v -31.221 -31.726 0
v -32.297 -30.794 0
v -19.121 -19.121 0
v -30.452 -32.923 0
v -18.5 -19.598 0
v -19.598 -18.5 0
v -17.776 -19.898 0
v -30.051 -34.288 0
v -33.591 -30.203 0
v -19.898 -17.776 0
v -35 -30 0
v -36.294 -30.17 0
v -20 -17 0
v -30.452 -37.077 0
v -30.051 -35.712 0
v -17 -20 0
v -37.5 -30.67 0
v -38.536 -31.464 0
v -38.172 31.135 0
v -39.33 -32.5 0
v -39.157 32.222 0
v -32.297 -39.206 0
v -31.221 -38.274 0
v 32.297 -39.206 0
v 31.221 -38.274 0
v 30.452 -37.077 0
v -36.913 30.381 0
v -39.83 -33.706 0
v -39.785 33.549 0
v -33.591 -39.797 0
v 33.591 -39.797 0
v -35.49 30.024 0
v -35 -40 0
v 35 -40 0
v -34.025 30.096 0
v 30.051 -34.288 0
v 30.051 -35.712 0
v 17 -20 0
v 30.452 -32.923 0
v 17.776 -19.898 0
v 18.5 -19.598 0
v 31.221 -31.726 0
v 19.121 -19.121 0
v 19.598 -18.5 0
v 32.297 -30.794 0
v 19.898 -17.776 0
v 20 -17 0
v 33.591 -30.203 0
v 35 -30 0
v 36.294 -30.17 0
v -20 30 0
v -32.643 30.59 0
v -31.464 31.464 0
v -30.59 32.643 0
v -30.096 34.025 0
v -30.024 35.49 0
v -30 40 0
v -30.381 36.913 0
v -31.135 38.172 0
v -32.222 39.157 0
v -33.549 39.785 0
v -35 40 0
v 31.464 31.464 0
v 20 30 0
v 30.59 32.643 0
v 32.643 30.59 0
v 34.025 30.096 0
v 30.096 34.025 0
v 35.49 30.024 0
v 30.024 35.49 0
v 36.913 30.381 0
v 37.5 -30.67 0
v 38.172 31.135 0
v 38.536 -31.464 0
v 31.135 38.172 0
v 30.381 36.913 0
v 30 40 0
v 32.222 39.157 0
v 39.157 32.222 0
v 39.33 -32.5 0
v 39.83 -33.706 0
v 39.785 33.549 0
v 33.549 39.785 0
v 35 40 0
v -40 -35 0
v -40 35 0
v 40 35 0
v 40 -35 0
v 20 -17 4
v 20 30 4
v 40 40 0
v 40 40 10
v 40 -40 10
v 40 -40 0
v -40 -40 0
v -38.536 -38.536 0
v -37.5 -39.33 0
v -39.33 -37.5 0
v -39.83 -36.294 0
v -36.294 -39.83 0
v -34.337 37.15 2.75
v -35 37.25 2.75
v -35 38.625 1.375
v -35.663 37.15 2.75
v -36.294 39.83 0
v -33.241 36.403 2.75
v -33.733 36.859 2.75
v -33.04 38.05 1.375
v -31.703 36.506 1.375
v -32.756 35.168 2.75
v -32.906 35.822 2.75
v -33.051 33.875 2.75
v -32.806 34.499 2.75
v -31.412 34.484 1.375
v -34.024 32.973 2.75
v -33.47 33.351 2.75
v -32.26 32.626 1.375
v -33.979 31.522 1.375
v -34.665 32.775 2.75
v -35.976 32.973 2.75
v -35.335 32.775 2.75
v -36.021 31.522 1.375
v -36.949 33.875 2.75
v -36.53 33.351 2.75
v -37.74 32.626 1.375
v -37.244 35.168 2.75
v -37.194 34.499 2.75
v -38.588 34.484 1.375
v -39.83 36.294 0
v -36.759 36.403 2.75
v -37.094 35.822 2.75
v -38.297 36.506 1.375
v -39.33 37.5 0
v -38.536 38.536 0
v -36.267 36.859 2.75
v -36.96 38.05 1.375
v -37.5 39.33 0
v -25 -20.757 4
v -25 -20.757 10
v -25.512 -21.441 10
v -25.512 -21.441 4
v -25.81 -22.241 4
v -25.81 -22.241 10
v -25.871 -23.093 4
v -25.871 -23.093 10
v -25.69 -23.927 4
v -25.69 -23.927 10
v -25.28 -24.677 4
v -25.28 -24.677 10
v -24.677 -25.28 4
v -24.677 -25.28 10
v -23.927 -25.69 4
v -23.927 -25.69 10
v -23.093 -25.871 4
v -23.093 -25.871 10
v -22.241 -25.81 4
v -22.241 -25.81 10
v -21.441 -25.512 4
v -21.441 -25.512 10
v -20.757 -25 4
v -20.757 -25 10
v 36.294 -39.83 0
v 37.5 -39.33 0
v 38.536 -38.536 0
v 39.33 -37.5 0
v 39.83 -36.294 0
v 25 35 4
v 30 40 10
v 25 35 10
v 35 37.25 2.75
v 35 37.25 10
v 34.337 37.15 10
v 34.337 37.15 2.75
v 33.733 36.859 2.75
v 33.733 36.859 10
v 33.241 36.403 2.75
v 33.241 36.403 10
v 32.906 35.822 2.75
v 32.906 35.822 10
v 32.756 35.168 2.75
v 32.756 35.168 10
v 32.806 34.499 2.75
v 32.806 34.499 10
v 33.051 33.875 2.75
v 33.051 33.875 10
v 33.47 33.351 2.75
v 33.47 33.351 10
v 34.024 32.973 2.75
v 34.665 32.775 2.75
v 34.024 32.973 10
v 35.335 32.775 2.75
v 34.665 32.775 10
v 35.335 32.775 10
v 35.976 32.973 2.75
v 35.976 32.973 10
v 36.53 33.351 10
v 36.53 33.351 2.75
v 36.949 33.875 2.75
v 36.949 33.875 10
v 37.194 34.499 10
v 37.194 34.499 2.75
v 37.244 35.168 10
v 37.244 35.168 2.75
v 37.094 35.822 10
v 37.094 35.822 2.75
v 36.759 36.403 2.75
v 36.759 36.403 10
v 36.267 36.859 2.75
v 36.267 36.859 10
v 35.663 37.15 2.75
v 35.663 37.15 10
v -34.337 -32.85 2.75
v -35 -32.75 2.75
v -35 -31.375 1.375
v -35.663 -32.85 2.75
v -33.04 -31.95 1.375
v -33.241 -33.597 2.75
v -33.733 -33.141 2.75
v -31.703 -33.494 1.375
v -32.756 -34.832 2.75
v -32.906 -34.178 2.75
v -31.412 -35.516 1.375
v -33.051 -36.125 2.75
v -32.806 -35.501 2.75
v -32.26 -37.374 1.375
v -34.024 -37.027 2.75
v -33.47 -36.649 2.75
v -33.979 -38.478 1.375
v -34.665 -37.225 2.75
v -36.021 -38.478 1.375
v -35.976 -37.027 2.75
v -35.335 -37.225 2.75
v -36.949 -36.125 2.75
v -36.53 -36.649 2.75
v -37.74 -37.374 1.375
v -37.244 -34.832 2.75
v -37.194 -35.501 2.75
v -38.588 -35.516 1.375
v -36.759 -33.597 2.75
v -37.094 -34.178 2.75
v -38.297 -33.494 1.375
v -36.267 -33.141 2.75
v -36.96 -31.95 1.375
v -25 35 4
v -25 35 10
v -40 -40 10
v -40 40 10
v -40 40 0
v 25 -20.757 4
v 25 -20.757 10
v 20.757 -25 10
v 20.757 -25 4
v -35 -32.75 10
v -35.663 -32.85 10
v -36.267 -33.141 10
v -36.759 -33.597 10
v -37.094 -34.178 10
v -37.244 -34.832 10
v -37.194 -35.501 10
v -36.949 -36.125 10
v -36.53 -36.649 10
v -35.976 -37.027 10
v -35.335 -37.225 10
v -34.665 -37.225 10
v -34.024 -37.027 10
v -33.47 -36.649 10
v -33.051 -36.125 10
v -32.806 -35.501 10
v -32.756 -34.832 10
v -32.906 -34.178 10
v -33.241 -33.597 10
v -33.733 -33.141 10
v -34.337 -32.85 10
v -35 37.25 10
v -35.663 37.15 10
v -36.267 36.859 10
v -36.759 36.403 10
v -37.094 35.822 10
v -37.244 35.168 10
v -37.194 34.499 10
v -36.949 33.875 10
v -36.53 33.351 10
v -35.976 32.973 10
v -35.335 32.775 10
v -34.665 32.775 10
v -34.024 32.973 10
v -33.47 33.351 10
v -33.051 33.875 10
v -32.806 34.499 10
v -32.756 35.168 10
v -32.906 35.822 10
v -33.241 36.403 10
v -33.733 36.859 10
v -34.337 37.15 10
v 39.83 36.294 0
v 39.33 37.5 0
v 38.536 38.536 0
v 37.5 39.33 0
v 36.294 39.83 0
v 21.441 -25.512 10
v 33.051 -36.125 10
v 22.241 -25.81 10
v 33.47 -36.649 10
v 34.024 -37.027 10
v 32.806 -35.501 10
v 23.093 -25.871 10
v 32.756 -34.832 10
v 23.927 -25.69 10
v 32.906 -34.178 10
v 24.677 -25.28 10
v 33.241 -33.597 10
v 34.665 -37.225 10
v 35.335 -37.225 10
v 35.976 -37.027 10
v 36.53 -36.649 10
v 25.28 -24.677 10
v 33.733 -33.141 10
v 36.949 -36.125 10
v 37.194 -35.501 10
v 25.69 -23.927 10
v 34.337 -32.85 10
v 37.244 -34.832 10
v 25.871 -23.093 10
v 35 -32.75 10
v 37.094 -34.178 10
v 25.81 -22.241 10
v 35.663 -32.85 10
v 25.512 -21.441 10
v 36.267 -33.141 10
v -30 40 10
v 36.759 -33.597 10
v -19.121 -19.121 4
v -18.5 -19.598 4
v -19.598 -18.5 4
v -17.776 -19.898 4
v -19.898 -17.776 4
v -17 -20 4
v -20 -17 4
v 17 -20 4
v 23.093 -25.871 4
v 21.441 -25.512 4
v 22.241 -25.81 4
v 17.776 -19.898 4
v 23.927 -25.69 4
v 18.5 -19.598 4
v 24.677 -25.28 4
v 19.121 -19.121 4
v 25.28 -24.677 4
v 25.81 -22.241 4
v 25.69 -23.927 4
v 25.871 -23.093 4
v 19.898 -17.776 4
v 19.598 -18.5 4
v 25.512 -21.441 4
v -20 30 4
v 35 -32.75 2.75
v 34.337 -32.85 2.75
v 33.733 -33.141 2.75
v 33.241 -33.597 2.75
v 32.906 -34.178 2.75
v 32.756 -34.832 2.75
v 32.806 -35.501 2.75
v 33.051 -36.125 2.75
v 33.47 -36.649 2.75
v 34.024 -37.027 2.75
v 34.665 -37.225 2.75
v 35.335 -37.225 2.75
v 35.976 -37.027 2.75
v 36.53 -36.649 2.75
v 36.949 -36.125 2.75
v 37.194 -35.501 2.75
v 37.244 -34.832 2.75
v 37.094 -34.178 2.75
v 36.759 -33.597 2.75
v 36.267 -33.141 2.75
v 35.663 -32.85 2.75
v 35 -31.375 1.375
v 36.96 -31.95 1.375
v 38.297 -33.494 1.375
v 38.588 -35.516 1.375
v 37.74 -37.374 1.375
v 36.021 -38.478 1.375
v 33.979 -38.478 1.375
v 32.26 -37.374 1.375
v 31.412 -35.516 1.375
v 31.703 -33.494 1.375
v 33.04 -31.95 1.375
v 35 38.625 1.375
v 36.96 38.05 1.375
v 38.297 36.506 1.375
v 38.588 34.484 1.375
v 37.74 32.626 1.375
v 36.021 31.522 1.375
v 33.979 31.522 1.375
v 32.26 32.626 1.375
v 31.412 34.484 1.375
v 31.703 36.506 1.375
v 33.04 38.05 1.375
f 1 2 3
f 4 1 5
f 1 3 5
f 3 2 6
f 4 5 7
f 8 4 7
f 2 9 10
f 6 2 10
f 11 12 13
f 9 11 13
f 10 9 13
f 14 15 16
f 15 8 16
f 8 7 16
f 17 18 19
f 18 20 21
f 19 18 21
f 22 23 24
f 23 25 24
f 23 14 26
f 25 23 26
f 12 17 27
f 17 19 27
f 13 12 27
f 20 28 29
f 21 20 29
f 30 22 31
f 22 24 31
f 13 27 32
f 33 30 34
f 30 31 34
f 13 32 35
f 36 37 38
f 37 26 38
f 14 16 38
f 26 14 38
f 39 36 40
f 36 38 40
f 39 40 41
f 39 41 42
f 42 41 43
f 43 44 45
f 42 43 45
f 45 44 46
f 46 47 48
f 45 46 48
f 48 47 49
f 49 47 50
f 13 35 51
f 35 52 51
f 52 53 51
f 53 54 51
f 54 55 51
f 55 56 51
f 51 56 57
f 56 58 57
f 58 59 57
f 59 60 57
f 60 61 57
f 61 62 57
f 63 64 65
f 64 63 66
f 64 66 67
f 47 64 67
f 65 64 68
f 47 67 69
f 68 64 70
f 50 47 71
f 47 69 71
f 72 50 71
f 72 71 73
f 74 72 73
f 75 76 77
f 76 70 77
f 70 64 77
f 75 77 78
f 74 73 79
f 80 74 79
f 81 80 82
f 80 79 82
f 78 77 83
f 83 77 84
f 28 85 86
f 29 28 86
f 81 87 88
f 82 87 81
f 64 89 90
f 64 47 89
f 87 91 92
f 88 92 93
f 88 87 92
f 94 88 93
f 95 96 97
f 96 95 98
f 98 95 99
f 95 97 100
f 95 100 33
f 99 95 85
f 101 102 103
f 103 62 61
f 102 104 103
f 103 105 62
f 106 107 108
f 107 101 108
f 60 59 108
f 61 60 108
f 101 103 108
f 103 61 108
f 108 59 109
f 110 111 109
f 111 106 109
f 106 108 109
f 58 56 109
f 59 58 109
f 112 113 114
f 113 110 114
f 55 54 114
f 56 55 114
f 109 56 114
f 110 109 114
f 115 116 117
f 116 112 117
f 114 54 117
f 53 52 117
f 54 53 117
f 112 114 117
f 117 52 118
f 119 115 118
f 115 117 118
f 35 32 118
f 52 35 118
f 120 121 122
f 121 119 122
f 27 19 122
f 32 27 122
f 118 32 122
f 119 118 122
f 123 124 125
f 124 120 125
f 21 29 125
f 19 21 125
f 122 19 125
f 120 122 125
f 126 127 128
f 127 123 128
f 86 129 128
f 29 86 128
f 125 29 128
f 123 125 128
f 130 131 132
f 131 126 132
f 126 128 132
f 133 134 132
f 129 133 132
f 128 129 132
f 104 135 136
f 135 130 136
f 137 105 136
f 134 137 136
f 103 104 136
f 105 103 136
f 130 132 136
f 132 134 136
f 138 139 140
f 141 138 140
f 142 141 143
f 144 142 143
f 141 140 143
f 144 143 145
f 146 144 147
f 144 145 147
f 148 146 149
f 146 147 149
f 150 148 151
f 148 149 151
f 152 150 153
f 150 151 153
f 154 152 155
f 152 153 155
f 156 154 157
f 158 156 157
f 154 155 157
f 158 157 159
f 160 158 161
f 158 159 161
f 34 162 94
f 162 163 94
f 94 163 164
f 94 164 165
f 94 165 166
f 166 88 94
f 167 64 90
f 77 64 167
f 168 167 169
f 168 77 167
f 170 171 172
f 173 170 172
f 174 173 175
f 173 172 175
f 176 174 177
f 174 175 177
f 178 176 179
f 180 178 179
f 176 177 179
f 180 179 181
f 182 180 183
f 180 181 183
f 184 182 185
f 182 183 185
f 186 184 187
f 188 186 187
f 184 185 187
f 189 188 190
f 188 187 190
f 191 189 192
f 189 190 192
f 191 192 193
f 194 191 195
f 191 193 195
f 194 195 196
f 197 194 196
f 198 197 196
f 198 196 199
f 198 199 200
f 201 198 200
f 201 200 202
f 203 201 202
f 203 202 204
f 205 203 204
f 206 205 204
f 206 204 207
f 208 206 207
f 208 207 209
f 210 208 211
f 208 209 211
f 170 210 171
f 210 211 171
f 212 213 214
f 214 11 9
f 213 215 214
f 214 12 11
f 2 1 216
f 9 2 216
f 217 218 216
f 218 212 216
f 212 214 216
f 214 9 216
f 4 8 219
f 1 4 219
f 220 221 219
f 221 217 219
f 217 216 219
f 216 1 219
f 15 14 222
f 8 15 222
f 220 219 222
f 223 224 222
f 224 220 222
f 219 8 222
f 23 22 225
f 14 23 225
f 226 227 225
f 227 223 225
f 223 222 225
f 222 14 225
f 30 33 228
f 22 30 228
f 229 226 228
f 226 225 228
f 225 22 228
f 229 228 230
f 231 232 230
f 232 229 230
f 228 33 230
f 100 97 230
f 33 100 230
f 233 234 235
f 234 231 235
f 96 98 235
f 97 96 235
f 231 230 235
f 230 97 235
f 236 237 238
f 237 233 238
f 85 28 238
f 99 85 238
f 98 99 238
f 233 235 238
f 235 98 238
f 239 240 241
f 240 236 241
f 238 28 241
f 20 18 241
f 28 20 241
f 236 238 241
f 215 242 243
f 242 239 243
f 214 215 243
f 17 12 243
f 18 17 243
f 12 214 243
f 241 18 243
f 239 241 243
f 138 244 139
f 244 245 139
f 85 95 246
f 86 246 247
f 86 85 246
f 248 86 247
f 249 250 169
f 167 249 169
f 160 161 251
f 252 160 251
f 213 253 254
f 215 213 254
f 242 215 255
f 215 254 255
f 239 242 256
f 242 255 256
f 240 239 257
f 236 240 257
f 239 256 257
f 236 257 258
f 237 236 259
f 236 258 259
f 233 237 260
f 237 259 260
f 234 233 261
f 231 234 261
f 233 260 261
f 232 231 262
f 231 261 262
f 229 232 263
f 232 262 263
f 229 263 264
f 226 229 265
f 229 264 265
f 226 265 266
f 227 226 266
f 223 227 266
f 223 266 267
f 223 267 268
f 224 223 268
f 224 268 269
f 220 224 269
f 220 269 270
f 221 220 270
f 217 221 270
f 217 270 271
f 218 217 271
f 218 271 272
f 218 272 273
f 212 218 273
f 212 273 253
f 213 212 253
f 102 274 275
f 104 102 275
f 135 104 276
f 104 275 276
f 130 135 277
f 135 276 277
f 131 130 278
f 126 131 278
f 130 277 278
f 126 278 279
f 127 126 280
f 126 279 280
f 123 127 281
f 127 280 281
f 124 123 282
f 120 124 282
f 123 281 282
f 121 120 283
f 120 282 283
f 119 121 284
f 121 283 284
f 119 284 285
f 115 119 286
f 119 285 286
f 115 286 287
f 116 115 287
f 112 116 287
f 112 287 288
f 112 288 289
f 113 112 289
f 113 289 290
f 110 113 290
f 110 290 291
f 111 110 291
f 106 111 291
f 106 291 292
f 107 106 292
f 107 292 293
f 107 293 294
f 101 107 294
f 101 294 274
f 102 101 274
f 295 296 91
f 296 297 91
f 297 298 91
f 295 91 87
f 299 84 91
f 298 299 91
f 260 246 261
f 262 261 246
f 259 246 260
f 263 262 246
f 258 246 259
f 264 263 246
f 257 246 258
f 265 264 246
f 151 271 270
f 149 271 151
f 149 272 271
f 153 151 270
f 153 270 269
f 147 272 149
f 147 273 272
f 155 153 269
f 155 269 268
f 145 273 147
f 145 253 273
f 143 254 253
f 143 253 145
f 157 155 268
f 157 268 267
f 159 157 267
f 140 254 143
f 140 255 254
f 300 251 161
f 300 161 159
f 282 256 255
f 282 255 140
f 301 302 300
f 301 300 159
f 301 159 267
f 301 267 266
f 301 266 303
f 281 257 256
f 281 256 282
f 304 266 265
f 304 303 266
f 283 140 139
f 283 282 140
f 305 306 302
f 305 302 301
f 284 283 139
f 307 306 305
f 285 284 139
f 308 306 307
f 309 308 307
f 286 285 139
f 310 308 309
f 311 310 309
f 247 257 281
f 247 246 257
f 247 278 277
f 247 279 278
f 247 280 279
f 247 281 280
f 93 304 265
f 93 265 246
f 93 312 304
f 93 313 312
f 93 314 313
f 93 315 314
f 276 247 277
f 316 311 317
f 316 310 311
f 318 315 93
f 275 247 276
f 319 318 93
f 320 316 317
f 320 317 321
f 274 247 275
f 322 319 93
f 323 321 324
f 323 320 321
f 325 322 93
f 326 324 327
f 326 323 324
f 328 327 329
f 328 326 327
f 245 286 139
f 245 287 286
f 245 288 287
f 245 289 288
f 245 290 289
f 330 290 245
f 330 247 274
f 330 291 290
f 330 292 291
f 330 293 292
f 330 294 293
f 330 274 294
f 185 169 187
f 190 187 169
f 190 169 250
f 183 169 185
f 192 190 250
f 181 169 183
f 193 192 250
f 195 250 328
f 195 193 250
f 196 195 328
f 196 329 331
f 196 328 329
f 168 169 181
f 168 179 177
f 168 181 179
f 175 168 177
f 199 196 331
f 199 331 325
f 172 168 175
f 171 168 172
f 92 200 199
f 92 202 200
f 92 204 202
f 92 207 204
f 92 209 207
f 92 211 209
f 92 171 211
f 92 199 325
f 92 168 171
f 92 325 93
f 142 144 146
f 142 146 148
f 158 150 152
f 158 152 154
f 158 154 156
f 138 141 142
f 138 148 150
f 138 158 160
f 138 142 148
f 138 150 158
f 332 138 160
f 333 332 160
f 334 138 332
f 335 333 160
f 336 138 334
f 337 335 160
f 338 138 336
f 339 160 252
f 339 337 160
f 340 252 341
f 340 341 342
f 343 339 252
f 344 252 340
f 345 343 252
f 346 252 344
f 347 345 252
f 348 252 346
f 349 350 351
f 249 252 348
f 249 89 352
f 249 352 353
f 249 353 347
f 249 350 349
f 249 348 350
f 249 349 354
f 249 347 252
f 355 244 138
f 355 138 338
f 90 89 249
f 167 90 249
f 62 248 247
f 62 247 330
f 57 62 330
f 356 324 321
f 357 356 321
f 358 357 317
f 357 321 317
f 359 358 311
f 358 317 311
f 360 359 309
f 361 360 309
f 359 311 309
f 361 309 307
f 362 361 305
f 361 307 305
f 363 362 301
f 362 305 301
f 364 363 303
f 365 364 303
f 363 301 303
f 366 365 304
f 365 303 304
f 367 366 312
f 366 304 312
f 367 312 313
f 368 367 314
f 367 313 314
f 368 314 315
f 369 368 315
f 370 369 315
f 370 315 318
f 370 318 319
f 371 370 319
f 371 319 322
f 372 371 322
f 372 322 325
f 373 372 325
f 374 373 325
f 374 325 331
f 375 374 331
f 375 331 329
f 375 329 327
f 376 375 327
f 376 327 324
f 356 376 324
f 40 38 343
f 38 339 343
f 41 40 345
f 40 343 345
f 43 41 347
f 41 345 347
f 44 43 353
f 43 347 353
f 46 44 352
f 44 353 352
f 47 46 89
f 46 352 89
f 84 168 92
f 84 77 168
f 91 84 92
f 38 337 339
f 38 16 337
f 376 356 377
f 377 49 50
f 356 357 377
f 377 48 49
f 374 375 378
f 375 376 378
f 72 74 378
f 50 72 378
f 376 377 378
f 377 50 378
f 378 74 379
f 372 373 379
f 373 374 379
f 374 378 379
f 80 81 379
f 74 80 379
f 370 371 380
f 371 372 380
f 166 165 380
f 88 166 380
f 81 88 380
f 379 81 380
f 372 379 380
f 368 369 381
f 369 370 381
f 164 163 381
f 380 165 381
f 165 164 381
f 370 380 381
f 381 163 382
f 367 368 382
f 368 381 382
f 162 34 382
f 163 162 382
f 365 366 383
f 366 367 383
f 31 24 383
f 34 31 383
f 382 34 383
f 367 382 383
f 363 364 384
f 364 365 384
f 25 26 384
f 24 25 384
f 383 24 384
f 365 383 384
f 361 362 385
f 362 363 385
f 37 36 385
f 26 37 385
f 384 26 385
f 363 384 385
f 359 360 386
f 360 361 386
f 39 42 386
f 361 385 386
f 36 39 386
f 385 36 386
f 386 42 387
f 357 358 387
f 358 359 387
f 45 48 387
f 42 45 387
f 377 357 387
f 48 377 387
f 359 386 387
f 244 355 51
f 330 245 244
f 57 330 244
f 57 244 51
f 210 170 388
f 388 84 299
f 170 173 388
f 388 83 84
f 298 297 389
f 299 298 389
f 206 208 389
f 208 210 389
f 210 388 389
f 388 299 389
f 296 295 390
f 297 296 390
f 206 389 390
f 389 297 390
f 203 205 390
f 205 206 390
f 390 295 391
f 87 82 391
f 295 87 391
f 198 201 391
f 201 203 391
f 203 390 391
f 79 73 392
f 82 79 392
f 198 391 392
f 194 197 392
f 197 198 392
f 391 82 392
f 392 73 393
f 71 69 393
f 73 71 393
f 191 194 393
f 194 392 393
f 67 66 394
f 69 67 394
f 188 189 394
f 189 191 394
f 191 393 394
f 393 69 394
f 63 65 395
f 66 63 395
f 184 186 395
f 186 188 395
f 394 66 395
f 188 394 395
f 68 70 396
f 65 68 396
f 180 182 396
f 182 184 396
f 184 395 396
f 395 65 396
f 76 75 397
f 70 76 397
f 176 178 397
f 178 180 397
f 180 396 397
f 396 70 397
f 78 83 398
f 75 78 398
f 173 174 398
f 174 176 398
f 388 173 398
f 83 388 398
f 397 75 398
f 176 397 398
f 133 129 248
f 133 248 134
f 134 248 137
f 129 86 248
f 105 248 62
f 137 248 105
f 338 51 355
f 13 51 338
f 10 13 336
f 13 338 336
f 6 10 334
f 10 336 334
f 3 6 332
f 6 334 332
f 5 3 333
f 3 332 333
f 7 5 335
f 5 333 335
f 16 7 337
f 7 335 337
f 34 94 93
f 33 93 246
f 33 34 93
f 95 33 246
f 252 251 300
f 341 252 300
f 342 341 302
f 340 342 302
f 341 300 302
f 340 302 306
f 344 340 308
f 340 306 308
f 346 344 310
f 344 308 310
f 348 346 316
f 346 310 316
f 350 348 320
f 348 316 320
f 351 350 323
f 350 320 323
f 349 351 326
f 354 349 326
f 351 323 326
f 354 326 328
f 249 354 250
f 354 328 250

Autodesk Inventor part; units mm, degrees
ref_plane "YZ Plane" through (0, 0, 0) normal (1, 0, 0) x (0, 1, 0)
ref_plane "XZ Plane" through (0, 0, 0) normal (0, 1, 0) x (-1, 0, 0)
ref_plane "XY Plane" through (0, 0, 0) normal (0, 0, 1) x (1, 0, 0)
sketch "Skizze1" plane through (0, 0, 0) normal (0, 0, 1) x (1, 0, 0)
  line L0 (40, 40) -> (40, -40)
  line L1 (40, -40) -> (-40, -40)
  line L2 (-40, -40) -> (-40, 40)
  line L3 (-40, 40) -> (40, -40) construction
  line L4 (40, 40) -> (-40, -40) construction
  line L5 (-20, 40) -> (-20, -20)
  line L6 (-20, -20) -> (20, -20)
  line L7 (20, -20) -> (20, 40)
  line L8 (-40, 40) -> (-20, 40)
  line L9 (20, 40) -> (40, 40)
  point P0 (0, 0)
  dimension "d0" = 40
  dimension "d1" = 80
extrude "Extrusion1" add sketch "Skizze1" along normal blind 10
sketch "Skizze2" plane through (0, 0, 10) normal (0, 0, 1) x (1, 0, 0)
  line L0 (-40, 40) -> (-40, -40) projected
  line L1 (40, 40) -> (20, 40) projected
  line L2 (20, 40) -> (20, -20) projected
  line L3 (20, -20) -> (-20, -20) projected
  line L4 (-20, -20) -> (-20, 40) projected
  line L5 (-20, 40) -> (-40, 40) projected
  line L6 (-25, 40) -> (-25, -20.7574)
  line L7 (-20.7574, -25) -> (20.7574, -25)
  line L8 (25, -20.7574) -> (25, 40)
  arc A0 (20.7574, -25) -> (25, -20.7574) centre (22.8787, -22.8787) ccw
  arc A1 (-25, -20.7574) -> (-20.7574, -25) centre (-22.8787, -22.8787) ccw
  line L9 (0, 56) -> (0, -56) construction
  point P0 (0, 0)
  dimension "d5" = 6
  dimension "d7" = 2.1213
  dimension "d8" = 2.1213
  dimension "d9" = 50
  dimension "d11" = 5
  dimension "d12" = 5
extrude "Extrusion2" cut sketch "Skizze2" against normal blind 6
fillet "Rundung1" radius 3 2 edges at (20, -20, 2) (-20, -20, 2)
chamfer "Fase1" distance 10 angle 45 2 edges at (-20, 40, 2) (20, 40, 2)
sketch "Skizze3" plane through (0, 0, 0) normal (0, 0, -1) x (-1, 0, 0)
  line L0 (-40, 40) -> (-20, 40) projected
  line L1 (-40, -40) -> (-40, 40) projected
  line L2 (40, -40) -> (-40, -40) projected
  line L3 (40, 40) -> (40, -40) projected
  line L4 (35, -35) -> (-35, -35)
  line L5 (-35, -35) -> (-35, 35)
  line L6 (-35, 35) -> (35, 35)
  line L7 (35, 35) -> (35, -35)
  line L8 (35, -35) -> (-35, 35) construction
  line L9 (-35, -35) -> (35, 35) construction
  point P0 (-21, 40)
  point P1 (0, 0)
  point P2 (0, 0)
  dimension "d22" = 5
  dimension "d23" = 5
  dimension "d24" = 5
  dimension "d25" = 5
  dimension "d33" = 70
  dimension "d34" = 70
hole "Bohrung1" at (-35, 35, 0) at (-35, -35, 0) at (35, -35, 0) at (35, 35, 0) direction (0, 0, 1) diameter 4.5 end through all countersink diameter 10 countersink angle 90 clearance for "Innensechskant-Senkkopfschraube DIN EN ISO 10642" size "M4" standard "DIN"
equation "\"d8\" = d7"
equation "\"d12\" = d11"
equation "\"d23\" = d22"
equation "\"d24\" = d22"
equation "\"d25\" = d22"
properties part number "Tunel_OdourPortSlidingMechanism" material "Polycarbonat, klar"
